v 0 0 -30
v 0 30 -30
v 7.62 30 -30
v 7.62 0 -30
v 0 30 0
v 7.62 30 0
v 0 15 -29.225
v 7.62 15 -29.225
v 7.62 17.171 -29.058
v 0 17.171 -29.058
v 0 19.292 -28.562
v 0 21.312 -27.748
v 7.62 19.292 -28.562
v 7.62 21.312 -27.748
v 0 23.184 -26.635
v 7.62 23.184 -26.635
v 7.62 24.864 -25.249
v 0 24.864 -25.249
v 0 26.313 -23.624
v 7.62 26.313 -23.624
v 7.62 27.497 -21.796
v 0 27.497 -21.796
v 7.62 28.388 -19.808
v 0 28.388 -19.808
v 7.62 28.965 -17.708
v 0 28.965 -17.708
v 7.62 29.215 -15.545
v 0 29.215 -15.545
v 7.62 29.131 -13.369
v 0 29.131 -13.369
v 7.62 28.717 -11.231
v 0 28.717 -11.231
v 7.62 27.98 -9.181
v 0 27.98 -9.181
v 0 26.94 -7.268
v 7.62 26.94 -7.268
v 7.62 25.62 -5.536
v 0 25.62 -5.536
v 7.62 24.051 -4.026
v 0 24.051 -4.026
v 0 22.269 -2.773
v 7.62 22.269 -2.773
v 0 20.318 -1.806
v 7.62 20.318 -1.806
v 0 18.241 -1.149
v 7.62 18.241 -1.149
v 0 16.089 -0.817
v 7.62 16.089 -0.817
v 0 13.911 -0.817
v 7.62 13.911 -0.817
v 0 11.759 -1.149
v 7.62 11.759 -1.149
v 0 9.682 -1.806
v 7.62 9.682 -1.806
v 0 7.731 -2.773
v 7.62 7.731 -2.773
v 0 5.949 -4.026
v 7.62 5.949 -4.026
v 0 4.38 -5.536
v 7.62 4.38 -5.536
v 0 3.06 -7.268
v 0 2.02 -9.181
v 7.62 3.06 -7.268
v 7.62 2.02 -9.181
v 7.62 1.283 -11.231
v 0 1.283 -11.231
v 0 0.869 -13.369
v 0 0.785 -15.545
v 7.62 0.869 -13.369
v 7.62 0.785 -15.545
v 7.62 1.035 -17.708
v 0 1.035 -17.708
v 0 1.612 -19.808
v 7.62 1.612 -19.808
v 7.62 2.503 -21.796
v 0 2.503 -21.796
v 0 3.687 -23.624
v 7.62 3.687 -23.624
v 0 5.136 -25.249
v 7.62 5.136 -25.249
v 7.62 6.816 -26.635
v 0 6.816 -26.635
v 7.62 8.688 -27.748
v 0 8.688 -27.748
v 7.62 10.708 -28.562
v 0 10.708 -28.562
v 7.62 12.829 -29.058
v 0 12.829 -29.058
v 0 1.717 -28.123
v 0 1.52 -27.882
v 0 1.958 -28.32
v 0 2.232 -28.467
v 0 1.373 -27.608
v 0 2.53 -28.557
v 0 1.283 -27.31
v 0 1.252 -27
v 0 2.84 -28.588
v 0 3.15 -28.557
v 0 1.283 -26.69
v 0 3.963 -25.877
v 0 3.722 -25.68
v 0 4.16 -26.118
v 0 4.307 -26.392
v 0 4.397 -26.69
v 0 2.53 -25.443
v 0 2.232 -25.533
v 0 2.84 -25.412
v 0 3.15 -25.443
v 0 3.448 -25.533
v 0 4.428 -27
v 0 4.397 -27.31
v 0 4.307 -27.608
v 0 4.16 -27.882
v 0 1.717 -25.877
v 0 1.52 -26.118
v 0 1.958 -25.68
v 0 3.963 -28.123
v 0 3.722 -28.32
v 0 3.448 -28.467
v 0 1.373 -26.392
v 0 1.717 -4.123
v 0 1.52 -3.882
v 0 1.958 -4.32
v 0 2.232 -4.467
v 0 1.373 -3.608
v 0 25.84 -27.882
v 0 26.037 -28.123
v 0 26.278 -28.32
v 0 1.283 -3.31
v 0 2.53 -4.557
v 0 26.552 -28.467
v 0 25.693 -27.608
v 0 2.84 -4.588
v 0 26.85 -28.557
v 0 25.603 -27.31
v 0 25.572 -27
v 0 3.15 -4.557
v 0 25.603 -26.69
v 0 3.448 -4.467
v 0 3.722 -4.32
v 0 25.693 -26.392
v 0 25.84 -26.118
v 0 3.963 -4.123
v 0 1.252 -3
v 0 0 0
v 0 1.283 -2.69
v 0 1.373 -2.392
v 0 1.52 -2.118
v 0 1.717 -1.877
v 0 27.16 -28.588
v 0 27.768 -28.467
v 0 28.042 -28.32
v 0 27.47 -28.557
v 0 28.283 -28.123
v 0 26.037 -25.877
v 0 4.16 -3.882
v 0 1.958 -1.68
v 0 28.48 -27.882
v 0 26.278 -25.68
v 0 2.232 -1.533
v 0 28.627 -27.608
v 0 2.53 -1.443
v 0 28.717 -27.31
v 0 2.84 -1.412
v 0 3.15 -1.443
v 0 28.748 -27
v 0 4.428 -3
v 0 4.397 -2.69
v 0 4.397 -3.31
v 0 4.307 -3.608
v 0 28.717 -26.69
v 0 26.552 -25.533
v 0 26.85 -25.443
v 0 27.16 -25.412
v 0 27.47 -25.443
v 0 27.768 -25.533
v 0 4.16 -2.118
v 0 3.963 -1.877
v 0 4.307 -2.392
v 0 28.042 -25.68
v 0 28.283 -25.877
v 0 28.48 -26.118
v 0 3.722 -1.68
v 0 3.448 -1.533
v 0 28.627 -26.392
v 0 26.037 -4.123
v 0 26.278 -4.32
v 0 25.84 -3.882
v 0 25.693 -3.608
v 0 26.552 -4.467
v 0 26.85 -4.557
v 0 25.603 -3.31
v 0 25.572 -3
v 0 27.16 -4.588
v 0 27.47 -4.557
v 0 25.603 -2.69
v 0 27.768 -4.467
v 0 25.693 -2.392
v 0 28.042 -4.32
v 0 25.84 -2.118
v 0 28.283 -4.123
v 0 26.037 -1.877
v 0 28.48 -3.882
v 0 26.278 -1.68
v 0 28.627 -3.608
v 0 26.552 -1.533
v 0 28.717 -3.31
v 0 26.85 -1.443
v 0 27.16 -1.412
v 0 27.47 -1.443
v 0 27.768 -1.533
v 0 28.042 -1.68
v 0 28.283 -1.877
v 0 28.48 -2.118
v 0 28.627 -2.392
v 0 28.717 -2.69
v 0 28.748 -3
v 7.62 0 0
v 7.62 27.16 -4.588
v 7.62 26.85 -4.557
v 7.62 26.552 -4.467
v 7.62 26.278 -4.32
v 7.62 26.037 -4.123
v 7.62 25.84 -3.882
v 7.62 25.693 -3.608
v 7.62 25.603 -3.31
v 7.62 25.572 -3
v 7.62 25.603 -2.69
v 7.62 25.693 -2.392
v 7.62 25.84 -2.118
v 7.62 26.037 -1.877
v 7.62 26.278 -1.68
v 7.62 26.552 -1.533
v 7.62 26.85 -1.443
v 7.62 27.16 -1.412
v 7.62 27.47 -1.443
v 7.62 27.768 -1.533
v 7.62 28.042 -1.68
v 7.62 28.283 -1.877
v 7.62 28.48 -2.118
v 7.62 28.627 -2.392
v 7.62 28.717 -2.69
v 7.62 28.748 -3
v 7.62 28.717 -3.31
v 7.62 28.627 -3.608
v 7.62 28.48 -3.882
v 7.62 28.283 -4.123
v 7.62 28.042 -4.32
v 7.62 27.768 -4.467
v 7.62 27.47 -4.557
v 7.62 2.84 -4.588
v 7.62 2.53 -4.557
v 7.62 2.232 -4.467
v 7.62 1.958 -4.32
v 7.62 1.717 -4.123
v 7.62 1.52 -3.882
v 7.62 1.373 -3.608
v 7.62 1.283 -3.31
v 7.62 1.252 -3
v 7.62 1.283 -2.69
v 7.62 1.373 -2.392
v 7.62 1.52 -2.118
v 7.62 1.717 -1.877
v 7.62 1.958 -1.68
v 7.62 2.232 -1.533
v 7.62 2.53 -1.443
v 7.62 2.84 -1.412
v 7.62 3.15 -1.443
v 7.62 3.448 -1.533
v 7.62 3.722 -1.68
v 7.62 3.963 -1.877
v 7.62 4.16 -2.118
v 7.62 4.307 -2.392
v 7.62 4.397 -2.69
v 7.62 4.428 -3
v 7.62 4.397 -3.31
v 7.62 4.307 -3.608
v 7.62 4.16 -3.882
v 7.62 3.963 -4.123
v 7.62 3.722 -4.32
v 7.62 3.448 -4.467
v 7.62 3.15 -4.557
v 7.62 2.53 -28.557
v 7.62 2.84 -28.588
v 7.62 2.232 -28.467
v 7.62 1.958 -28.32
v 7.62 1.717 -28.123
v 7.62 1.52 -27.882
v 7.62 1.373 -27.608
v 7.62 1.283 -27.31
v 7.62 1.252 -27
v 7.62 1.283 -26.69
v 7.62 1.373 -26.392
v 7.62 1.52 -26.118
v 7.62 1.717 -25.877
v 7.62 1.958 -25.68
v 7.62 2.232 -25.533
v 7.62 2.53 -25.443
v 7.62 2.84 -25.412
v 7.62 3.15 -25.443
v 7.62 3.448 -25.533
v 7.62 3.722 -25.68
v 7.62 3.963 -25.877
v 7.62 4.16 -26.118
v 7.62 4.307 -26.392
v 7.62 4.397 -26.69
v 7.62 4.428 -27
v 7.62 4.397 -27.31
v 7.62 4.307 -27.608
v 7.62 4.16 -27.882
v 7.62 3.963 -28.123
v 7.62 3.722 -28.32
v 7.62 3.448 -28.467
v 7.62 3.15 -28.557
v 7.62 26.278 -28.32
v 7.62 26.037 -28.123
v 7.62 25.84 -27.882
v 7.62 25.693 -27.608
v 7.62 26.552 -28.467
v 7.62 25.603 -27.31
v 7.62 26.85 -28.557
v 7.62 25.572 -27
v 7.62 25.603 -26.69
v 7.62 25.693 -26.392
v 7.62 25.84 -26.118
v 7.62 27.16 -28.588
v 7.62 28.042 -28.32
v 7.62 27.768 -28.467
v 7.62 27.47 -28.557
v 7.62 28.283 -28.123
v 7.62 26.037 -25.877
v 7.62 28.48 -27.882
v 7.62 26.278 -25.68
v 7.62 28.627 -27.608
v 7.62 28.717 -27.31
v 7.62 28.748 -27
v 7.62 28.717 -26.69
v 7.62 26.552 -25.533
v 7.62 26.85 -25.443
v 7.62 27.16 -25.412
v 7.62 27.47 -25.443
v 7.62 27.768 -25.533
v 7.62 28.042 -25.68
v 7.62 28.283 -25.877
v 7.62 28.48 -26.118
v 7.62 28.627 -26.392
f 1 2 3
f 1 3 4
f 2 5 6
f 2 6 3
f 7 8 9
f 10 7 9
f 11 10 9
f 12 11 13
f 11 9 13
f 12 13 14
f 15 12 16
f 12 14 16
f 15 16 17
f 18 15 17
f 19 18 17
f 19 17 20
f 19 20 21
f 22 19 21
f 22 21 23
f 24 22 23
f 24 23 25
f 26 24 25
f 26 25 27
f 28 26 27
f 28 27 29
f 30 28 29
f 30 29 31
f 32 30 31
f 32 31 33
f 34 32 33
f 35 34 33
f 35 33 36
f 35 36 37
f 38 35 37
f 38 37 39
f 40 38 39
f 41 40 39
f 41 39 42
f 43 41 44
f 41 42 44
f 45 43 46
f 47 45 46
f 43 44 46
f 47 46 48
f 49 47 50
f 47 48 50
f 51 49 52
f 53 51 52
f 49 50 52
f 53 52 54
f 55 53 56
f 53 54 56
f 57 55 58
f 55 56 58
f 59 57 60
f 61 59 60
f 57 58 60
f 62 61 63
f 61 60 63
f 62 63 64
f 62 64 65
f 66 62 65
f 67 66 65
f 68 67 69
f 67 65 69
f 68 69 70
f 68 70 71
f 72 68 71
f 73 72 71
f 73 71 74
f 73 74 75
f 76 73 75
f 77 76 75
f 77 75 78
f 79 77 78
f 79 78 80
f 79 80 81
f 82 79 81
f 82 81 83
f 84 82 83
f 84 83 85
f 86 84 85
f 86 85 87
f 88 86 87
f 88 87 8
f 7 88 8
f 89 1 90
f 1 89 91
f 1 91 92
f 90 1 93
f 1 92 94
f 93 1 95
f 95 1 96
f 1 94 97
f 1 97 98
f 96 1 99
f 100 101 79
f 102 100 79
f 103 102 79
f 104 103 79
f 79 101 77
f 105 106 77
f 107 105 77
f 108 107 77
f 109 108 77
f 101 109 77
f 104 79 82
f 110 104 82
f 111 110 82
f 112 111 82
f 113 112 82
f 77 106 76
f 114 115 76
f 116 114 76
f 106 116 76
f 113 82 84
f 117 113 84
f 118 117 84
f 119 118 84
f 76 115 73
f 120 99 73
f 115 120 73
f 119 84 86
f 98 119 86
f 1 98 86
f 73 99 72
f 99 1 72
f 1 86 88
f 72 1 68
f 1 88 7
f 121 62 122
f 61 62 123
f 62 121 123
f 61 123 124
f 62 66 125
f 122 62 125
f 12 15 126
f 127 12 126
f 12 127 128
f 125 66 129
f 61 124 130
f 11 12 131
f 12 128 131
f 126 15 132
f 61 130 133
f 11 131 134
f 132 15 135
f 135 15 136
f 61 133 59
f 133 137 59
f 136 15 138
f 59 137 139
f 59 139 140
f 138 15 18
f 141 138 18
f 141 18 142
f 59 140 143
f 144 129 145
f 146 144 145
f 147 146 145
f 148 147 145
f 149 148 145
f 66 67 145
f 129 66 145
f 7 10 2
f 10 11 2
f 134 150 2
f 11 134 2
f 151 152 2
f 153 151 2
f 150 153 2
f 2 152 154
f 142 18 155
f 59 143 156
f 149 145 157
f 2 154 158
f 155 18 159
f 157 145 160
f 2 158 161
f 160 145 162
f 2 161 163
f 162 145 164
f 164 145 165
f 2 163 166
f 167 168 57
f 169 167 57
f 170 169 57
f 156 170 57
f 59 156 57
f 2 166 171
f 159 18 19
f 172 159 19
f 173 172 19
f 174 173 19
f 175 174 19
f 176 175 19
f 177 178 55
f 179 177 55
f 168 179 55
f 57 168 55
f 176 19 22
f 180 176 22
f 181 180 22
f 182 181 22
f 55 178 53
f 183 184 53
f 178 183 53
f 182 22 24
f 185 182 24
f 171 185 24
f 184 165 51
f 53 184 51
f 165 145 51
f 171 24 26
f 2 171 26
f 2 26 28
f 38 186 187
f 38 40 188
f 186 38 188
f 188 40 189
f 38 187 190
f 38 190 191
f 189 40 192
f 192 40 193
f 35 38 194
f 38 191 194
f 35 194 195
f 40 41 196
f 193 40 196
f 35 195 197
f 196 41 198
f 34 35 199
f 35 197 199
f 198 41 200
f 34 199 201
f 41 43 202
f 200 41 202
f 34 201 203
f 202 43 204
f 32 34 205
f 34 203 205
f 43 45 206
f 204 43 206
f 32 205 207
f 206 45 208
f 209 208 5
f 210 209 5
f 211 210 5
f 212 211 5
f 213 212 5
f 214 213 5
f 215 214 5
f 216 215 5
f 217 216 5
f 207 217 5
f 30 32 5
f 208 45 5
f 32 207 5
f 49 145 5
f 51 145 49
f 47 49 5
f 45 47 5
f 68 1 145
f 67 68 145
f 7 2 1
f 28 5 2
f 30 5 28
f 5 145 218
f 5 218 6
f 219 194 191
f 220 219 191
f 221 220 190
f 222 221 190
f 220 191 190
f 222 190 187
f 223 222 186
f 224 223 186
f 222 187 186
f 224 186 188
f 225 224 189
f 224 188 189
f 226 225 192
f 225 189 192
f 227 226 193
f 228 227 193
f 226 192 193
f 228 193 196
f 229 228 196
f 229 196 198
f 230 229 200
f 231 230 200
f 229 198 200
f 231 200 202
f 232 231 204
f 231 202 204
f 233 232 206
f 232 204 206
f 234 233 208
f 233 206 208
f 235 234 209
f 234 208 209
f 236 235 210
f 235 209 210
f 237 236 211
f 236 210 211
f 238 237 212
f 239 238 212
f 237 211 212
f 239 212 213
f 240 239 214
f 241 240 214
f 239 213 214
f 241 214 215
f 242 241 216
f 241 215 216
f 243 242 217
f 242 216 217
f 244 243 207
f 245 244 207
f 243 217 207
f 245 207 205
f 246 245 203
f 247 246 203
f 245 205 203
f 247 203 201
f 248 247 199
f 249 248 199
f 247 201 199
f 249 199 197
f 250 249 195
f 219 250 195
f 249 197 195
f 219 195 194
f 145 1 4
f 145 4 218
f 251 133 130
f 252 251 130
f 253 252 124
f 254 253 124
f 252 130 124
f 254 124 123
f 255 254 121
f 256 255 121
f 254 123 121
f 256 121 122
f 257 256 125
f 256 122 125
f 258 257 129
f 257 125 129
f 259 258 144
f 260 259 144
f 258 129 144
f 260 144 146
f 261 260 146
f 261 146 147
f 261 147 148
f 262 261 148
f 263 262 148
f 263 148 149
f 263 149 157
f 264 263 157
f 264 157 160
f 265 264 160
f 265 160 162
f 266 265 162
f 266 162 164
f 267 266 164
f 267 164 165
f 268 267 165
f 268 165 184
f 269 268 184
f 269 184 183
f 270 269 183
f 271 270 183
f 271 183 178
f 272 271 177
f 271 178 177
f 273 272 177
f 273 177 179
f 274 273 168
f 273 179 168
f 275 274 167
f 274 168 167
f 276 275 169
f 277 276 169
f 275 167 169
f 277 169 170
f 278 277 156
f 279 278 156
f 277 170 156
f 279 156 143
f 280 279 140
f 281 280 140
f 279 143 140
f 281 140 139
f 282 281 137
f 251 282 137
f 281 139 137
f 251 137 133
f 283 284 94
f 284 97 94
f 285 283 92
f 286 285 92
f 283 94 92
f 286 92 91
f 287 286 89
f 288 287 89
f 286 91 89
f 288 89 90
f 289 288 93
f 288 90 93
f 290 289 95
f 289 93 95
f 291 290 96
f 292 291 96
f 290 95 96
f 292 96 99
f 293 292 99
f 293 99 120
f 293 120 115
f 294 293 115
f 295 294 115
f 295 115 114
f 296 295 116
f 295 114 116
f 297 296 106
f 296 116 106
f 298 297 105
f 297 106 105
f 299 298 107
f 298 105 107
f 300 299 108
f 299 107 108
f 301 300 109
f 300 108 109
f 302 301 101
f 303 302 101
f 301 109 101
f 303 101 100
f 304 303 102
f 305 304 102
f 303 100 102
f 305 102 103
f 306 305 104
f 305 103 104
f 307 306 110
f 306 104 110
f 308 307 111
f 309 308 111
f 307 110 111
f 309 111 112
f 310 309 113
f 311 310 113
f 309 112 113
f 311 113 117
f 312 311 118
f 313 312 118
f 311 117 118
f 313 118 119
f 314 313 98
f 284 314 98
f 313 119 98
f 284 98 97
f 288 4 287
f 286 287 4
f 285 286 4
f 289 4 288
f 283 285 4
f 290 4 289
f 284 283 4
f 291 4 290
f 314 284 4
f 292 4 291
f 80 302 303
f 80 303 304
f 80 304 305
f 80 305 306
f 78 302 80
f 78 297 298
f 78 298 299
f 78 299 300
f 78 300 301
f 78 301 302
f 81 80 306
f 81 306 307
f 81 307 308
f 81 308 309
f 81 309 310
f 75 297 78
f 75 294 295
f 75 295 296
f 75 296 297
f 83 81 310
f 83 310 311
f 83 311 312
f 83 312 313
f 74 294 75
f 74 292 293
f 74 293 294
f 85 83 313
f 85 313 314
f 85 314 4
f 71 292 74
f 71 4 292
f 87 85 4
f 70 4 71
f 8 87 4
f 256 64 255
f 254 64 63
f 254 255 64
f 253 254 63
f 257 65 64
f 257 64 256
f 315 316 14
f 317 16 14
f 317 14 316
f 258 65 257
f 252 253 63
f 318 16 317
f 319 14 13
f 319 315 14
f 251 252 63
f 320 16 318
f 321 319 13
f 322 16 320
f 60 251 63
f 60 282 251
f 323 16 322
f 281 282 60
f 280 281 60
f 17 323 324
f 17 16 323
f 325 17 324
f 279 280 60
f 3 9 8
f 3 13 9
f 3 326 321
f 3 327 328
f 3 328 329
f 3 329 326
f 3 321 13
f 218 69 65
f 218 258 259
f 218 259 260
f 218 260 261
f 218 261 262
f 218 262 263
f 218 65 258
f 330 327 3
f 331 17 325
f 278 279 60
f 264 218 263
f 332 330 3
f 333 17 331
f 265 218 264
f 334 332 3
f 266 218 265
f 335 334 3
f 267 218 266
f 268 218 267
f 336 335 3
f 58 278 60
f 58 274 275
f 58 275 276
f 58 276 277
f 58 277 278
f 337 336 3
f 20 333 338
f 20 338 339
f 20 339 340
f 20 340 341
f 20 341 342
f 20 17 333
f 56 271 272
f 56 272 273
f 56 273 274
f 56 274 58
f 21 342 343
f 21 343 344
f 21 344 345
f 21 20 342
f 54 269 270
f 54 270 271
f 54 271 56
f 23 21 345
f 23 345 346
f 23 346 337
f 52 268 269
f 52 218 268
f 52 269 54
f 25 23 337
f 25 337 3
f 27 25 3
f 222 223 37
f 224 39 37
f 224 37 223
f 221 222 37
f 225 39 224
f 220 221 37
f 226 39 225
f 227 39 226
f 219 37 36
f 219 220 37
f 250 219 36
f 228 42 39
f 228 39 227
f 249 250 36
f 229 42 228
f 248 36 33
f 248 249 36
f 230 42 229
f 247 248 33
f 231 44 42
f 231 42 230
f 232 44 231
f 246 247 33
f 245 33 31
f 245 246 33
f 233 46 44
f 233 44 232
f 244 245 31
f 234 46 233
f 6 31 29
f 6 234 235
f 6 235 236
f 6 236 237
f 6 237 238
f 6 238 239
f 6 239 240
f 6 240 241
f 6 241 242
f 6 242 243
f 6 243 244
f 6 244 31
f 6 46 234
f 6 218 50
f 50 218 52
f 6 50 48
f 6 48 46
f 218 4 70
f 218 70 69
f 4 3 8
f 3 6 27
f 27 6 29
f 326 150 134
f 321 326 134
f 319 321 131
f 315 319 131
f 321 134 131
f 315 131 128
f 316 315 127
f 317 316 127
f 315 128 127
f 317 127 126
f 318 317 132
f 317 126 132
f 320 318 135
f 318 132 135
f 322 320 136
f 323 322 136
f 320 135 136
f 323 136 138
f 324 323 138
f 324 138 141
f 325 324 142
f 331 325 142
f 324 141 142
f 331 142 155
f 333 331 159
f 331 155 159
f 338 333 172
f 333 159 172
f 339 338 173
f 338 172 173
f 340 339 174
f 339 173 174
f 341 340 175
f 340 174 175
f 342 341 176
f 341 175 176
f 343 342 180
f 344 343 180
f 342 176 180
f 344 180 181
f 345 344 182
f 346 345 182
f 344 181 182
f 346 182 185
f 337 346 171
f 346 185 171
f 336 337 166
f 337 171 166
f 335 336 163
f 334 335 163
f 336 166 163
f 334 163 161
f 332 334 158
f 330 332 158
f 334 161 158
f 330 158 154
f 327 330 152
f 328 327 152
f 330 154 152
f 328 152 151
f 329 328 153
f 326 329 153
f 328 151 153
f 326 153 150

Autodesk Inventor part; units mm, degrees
ref_plane "YZ Plane" through (0, 0, 0) normal (1, 0, 0) x (0, 1, 0)
ref_plane "XZ Plane" through (0, 0, 0) normal (0, 1, 0) x (-1, 0, 0)
ref_plane "XY Plane" through (0, 0, 0) normal (0, 0, 1) x (1, 0, 0)
sketch "Sketch1" plane through (0, 0, 0) normal (1, 0, 0) x (0, 1, 0)
  line L0 (0, 0) -> (30, 0)
  line L1 (30, 0) -> (30, -30)
  line L2 (30, -30) -> (0, -30)
  line L3 (0, -30) -> (0, 0)
  dimension "d0" = 30
  dimension "d1" = 30
extrude "Extrusion1" add sketch "Sketch1" along normal blind 7.62
sketch "Sketch2" plane through (7.62, 0, 0) normal (1, 0, 0) x (0, 0, -1)
  line L0 (0, 30) -> (0, 0) projected
  line L1 (0, 0) -> (30, 0) projected
  line L2 (30, 0) -> (30, 30) projected
  line L3 (30, 30) -> (0, 30) projected
  line L4 (15, 30) -> (15, 0) construction
  line L5 (0, 15) -> (30, 15) construction
  circle A0 centre (15, 15) radius 14.225
  dimension "d4" = 28.45
extrude "Extrusion2" cut sketch "Sketch2" against normal blind 7.62 contours A0
sketch "Sketch3" plane through (7.62, 0, 0) normal (1, 0, 0) x (0, 0, -1)
  line L0 (0, 30) -> (30, 30) construction
  line L1 (15, 30) -> (15, 0) construction
  line L2 (30, 0) -> (0, 0) construction
  line L3 (0, 0) -> (0, 30) construction
  line L4 (0, 15) -> (29.023, 15) construction
  point P0 (3, 2.84)
  point P1 (3, 27.16)
  point P2 (27, 2.84)
  point P3 (27, 27.16)
  dimension "d15" = 2.84
hole "Hole1" at (7.62, 2.84, -3) at (7.62, 27.16, -3) at (7.62, 27.16, -27) at (7.62, 2.84, -27) direction (-1, 0, 0) diameter 3.175 end through all
properties part number "Pi Fan" material "PPS Plastic"
